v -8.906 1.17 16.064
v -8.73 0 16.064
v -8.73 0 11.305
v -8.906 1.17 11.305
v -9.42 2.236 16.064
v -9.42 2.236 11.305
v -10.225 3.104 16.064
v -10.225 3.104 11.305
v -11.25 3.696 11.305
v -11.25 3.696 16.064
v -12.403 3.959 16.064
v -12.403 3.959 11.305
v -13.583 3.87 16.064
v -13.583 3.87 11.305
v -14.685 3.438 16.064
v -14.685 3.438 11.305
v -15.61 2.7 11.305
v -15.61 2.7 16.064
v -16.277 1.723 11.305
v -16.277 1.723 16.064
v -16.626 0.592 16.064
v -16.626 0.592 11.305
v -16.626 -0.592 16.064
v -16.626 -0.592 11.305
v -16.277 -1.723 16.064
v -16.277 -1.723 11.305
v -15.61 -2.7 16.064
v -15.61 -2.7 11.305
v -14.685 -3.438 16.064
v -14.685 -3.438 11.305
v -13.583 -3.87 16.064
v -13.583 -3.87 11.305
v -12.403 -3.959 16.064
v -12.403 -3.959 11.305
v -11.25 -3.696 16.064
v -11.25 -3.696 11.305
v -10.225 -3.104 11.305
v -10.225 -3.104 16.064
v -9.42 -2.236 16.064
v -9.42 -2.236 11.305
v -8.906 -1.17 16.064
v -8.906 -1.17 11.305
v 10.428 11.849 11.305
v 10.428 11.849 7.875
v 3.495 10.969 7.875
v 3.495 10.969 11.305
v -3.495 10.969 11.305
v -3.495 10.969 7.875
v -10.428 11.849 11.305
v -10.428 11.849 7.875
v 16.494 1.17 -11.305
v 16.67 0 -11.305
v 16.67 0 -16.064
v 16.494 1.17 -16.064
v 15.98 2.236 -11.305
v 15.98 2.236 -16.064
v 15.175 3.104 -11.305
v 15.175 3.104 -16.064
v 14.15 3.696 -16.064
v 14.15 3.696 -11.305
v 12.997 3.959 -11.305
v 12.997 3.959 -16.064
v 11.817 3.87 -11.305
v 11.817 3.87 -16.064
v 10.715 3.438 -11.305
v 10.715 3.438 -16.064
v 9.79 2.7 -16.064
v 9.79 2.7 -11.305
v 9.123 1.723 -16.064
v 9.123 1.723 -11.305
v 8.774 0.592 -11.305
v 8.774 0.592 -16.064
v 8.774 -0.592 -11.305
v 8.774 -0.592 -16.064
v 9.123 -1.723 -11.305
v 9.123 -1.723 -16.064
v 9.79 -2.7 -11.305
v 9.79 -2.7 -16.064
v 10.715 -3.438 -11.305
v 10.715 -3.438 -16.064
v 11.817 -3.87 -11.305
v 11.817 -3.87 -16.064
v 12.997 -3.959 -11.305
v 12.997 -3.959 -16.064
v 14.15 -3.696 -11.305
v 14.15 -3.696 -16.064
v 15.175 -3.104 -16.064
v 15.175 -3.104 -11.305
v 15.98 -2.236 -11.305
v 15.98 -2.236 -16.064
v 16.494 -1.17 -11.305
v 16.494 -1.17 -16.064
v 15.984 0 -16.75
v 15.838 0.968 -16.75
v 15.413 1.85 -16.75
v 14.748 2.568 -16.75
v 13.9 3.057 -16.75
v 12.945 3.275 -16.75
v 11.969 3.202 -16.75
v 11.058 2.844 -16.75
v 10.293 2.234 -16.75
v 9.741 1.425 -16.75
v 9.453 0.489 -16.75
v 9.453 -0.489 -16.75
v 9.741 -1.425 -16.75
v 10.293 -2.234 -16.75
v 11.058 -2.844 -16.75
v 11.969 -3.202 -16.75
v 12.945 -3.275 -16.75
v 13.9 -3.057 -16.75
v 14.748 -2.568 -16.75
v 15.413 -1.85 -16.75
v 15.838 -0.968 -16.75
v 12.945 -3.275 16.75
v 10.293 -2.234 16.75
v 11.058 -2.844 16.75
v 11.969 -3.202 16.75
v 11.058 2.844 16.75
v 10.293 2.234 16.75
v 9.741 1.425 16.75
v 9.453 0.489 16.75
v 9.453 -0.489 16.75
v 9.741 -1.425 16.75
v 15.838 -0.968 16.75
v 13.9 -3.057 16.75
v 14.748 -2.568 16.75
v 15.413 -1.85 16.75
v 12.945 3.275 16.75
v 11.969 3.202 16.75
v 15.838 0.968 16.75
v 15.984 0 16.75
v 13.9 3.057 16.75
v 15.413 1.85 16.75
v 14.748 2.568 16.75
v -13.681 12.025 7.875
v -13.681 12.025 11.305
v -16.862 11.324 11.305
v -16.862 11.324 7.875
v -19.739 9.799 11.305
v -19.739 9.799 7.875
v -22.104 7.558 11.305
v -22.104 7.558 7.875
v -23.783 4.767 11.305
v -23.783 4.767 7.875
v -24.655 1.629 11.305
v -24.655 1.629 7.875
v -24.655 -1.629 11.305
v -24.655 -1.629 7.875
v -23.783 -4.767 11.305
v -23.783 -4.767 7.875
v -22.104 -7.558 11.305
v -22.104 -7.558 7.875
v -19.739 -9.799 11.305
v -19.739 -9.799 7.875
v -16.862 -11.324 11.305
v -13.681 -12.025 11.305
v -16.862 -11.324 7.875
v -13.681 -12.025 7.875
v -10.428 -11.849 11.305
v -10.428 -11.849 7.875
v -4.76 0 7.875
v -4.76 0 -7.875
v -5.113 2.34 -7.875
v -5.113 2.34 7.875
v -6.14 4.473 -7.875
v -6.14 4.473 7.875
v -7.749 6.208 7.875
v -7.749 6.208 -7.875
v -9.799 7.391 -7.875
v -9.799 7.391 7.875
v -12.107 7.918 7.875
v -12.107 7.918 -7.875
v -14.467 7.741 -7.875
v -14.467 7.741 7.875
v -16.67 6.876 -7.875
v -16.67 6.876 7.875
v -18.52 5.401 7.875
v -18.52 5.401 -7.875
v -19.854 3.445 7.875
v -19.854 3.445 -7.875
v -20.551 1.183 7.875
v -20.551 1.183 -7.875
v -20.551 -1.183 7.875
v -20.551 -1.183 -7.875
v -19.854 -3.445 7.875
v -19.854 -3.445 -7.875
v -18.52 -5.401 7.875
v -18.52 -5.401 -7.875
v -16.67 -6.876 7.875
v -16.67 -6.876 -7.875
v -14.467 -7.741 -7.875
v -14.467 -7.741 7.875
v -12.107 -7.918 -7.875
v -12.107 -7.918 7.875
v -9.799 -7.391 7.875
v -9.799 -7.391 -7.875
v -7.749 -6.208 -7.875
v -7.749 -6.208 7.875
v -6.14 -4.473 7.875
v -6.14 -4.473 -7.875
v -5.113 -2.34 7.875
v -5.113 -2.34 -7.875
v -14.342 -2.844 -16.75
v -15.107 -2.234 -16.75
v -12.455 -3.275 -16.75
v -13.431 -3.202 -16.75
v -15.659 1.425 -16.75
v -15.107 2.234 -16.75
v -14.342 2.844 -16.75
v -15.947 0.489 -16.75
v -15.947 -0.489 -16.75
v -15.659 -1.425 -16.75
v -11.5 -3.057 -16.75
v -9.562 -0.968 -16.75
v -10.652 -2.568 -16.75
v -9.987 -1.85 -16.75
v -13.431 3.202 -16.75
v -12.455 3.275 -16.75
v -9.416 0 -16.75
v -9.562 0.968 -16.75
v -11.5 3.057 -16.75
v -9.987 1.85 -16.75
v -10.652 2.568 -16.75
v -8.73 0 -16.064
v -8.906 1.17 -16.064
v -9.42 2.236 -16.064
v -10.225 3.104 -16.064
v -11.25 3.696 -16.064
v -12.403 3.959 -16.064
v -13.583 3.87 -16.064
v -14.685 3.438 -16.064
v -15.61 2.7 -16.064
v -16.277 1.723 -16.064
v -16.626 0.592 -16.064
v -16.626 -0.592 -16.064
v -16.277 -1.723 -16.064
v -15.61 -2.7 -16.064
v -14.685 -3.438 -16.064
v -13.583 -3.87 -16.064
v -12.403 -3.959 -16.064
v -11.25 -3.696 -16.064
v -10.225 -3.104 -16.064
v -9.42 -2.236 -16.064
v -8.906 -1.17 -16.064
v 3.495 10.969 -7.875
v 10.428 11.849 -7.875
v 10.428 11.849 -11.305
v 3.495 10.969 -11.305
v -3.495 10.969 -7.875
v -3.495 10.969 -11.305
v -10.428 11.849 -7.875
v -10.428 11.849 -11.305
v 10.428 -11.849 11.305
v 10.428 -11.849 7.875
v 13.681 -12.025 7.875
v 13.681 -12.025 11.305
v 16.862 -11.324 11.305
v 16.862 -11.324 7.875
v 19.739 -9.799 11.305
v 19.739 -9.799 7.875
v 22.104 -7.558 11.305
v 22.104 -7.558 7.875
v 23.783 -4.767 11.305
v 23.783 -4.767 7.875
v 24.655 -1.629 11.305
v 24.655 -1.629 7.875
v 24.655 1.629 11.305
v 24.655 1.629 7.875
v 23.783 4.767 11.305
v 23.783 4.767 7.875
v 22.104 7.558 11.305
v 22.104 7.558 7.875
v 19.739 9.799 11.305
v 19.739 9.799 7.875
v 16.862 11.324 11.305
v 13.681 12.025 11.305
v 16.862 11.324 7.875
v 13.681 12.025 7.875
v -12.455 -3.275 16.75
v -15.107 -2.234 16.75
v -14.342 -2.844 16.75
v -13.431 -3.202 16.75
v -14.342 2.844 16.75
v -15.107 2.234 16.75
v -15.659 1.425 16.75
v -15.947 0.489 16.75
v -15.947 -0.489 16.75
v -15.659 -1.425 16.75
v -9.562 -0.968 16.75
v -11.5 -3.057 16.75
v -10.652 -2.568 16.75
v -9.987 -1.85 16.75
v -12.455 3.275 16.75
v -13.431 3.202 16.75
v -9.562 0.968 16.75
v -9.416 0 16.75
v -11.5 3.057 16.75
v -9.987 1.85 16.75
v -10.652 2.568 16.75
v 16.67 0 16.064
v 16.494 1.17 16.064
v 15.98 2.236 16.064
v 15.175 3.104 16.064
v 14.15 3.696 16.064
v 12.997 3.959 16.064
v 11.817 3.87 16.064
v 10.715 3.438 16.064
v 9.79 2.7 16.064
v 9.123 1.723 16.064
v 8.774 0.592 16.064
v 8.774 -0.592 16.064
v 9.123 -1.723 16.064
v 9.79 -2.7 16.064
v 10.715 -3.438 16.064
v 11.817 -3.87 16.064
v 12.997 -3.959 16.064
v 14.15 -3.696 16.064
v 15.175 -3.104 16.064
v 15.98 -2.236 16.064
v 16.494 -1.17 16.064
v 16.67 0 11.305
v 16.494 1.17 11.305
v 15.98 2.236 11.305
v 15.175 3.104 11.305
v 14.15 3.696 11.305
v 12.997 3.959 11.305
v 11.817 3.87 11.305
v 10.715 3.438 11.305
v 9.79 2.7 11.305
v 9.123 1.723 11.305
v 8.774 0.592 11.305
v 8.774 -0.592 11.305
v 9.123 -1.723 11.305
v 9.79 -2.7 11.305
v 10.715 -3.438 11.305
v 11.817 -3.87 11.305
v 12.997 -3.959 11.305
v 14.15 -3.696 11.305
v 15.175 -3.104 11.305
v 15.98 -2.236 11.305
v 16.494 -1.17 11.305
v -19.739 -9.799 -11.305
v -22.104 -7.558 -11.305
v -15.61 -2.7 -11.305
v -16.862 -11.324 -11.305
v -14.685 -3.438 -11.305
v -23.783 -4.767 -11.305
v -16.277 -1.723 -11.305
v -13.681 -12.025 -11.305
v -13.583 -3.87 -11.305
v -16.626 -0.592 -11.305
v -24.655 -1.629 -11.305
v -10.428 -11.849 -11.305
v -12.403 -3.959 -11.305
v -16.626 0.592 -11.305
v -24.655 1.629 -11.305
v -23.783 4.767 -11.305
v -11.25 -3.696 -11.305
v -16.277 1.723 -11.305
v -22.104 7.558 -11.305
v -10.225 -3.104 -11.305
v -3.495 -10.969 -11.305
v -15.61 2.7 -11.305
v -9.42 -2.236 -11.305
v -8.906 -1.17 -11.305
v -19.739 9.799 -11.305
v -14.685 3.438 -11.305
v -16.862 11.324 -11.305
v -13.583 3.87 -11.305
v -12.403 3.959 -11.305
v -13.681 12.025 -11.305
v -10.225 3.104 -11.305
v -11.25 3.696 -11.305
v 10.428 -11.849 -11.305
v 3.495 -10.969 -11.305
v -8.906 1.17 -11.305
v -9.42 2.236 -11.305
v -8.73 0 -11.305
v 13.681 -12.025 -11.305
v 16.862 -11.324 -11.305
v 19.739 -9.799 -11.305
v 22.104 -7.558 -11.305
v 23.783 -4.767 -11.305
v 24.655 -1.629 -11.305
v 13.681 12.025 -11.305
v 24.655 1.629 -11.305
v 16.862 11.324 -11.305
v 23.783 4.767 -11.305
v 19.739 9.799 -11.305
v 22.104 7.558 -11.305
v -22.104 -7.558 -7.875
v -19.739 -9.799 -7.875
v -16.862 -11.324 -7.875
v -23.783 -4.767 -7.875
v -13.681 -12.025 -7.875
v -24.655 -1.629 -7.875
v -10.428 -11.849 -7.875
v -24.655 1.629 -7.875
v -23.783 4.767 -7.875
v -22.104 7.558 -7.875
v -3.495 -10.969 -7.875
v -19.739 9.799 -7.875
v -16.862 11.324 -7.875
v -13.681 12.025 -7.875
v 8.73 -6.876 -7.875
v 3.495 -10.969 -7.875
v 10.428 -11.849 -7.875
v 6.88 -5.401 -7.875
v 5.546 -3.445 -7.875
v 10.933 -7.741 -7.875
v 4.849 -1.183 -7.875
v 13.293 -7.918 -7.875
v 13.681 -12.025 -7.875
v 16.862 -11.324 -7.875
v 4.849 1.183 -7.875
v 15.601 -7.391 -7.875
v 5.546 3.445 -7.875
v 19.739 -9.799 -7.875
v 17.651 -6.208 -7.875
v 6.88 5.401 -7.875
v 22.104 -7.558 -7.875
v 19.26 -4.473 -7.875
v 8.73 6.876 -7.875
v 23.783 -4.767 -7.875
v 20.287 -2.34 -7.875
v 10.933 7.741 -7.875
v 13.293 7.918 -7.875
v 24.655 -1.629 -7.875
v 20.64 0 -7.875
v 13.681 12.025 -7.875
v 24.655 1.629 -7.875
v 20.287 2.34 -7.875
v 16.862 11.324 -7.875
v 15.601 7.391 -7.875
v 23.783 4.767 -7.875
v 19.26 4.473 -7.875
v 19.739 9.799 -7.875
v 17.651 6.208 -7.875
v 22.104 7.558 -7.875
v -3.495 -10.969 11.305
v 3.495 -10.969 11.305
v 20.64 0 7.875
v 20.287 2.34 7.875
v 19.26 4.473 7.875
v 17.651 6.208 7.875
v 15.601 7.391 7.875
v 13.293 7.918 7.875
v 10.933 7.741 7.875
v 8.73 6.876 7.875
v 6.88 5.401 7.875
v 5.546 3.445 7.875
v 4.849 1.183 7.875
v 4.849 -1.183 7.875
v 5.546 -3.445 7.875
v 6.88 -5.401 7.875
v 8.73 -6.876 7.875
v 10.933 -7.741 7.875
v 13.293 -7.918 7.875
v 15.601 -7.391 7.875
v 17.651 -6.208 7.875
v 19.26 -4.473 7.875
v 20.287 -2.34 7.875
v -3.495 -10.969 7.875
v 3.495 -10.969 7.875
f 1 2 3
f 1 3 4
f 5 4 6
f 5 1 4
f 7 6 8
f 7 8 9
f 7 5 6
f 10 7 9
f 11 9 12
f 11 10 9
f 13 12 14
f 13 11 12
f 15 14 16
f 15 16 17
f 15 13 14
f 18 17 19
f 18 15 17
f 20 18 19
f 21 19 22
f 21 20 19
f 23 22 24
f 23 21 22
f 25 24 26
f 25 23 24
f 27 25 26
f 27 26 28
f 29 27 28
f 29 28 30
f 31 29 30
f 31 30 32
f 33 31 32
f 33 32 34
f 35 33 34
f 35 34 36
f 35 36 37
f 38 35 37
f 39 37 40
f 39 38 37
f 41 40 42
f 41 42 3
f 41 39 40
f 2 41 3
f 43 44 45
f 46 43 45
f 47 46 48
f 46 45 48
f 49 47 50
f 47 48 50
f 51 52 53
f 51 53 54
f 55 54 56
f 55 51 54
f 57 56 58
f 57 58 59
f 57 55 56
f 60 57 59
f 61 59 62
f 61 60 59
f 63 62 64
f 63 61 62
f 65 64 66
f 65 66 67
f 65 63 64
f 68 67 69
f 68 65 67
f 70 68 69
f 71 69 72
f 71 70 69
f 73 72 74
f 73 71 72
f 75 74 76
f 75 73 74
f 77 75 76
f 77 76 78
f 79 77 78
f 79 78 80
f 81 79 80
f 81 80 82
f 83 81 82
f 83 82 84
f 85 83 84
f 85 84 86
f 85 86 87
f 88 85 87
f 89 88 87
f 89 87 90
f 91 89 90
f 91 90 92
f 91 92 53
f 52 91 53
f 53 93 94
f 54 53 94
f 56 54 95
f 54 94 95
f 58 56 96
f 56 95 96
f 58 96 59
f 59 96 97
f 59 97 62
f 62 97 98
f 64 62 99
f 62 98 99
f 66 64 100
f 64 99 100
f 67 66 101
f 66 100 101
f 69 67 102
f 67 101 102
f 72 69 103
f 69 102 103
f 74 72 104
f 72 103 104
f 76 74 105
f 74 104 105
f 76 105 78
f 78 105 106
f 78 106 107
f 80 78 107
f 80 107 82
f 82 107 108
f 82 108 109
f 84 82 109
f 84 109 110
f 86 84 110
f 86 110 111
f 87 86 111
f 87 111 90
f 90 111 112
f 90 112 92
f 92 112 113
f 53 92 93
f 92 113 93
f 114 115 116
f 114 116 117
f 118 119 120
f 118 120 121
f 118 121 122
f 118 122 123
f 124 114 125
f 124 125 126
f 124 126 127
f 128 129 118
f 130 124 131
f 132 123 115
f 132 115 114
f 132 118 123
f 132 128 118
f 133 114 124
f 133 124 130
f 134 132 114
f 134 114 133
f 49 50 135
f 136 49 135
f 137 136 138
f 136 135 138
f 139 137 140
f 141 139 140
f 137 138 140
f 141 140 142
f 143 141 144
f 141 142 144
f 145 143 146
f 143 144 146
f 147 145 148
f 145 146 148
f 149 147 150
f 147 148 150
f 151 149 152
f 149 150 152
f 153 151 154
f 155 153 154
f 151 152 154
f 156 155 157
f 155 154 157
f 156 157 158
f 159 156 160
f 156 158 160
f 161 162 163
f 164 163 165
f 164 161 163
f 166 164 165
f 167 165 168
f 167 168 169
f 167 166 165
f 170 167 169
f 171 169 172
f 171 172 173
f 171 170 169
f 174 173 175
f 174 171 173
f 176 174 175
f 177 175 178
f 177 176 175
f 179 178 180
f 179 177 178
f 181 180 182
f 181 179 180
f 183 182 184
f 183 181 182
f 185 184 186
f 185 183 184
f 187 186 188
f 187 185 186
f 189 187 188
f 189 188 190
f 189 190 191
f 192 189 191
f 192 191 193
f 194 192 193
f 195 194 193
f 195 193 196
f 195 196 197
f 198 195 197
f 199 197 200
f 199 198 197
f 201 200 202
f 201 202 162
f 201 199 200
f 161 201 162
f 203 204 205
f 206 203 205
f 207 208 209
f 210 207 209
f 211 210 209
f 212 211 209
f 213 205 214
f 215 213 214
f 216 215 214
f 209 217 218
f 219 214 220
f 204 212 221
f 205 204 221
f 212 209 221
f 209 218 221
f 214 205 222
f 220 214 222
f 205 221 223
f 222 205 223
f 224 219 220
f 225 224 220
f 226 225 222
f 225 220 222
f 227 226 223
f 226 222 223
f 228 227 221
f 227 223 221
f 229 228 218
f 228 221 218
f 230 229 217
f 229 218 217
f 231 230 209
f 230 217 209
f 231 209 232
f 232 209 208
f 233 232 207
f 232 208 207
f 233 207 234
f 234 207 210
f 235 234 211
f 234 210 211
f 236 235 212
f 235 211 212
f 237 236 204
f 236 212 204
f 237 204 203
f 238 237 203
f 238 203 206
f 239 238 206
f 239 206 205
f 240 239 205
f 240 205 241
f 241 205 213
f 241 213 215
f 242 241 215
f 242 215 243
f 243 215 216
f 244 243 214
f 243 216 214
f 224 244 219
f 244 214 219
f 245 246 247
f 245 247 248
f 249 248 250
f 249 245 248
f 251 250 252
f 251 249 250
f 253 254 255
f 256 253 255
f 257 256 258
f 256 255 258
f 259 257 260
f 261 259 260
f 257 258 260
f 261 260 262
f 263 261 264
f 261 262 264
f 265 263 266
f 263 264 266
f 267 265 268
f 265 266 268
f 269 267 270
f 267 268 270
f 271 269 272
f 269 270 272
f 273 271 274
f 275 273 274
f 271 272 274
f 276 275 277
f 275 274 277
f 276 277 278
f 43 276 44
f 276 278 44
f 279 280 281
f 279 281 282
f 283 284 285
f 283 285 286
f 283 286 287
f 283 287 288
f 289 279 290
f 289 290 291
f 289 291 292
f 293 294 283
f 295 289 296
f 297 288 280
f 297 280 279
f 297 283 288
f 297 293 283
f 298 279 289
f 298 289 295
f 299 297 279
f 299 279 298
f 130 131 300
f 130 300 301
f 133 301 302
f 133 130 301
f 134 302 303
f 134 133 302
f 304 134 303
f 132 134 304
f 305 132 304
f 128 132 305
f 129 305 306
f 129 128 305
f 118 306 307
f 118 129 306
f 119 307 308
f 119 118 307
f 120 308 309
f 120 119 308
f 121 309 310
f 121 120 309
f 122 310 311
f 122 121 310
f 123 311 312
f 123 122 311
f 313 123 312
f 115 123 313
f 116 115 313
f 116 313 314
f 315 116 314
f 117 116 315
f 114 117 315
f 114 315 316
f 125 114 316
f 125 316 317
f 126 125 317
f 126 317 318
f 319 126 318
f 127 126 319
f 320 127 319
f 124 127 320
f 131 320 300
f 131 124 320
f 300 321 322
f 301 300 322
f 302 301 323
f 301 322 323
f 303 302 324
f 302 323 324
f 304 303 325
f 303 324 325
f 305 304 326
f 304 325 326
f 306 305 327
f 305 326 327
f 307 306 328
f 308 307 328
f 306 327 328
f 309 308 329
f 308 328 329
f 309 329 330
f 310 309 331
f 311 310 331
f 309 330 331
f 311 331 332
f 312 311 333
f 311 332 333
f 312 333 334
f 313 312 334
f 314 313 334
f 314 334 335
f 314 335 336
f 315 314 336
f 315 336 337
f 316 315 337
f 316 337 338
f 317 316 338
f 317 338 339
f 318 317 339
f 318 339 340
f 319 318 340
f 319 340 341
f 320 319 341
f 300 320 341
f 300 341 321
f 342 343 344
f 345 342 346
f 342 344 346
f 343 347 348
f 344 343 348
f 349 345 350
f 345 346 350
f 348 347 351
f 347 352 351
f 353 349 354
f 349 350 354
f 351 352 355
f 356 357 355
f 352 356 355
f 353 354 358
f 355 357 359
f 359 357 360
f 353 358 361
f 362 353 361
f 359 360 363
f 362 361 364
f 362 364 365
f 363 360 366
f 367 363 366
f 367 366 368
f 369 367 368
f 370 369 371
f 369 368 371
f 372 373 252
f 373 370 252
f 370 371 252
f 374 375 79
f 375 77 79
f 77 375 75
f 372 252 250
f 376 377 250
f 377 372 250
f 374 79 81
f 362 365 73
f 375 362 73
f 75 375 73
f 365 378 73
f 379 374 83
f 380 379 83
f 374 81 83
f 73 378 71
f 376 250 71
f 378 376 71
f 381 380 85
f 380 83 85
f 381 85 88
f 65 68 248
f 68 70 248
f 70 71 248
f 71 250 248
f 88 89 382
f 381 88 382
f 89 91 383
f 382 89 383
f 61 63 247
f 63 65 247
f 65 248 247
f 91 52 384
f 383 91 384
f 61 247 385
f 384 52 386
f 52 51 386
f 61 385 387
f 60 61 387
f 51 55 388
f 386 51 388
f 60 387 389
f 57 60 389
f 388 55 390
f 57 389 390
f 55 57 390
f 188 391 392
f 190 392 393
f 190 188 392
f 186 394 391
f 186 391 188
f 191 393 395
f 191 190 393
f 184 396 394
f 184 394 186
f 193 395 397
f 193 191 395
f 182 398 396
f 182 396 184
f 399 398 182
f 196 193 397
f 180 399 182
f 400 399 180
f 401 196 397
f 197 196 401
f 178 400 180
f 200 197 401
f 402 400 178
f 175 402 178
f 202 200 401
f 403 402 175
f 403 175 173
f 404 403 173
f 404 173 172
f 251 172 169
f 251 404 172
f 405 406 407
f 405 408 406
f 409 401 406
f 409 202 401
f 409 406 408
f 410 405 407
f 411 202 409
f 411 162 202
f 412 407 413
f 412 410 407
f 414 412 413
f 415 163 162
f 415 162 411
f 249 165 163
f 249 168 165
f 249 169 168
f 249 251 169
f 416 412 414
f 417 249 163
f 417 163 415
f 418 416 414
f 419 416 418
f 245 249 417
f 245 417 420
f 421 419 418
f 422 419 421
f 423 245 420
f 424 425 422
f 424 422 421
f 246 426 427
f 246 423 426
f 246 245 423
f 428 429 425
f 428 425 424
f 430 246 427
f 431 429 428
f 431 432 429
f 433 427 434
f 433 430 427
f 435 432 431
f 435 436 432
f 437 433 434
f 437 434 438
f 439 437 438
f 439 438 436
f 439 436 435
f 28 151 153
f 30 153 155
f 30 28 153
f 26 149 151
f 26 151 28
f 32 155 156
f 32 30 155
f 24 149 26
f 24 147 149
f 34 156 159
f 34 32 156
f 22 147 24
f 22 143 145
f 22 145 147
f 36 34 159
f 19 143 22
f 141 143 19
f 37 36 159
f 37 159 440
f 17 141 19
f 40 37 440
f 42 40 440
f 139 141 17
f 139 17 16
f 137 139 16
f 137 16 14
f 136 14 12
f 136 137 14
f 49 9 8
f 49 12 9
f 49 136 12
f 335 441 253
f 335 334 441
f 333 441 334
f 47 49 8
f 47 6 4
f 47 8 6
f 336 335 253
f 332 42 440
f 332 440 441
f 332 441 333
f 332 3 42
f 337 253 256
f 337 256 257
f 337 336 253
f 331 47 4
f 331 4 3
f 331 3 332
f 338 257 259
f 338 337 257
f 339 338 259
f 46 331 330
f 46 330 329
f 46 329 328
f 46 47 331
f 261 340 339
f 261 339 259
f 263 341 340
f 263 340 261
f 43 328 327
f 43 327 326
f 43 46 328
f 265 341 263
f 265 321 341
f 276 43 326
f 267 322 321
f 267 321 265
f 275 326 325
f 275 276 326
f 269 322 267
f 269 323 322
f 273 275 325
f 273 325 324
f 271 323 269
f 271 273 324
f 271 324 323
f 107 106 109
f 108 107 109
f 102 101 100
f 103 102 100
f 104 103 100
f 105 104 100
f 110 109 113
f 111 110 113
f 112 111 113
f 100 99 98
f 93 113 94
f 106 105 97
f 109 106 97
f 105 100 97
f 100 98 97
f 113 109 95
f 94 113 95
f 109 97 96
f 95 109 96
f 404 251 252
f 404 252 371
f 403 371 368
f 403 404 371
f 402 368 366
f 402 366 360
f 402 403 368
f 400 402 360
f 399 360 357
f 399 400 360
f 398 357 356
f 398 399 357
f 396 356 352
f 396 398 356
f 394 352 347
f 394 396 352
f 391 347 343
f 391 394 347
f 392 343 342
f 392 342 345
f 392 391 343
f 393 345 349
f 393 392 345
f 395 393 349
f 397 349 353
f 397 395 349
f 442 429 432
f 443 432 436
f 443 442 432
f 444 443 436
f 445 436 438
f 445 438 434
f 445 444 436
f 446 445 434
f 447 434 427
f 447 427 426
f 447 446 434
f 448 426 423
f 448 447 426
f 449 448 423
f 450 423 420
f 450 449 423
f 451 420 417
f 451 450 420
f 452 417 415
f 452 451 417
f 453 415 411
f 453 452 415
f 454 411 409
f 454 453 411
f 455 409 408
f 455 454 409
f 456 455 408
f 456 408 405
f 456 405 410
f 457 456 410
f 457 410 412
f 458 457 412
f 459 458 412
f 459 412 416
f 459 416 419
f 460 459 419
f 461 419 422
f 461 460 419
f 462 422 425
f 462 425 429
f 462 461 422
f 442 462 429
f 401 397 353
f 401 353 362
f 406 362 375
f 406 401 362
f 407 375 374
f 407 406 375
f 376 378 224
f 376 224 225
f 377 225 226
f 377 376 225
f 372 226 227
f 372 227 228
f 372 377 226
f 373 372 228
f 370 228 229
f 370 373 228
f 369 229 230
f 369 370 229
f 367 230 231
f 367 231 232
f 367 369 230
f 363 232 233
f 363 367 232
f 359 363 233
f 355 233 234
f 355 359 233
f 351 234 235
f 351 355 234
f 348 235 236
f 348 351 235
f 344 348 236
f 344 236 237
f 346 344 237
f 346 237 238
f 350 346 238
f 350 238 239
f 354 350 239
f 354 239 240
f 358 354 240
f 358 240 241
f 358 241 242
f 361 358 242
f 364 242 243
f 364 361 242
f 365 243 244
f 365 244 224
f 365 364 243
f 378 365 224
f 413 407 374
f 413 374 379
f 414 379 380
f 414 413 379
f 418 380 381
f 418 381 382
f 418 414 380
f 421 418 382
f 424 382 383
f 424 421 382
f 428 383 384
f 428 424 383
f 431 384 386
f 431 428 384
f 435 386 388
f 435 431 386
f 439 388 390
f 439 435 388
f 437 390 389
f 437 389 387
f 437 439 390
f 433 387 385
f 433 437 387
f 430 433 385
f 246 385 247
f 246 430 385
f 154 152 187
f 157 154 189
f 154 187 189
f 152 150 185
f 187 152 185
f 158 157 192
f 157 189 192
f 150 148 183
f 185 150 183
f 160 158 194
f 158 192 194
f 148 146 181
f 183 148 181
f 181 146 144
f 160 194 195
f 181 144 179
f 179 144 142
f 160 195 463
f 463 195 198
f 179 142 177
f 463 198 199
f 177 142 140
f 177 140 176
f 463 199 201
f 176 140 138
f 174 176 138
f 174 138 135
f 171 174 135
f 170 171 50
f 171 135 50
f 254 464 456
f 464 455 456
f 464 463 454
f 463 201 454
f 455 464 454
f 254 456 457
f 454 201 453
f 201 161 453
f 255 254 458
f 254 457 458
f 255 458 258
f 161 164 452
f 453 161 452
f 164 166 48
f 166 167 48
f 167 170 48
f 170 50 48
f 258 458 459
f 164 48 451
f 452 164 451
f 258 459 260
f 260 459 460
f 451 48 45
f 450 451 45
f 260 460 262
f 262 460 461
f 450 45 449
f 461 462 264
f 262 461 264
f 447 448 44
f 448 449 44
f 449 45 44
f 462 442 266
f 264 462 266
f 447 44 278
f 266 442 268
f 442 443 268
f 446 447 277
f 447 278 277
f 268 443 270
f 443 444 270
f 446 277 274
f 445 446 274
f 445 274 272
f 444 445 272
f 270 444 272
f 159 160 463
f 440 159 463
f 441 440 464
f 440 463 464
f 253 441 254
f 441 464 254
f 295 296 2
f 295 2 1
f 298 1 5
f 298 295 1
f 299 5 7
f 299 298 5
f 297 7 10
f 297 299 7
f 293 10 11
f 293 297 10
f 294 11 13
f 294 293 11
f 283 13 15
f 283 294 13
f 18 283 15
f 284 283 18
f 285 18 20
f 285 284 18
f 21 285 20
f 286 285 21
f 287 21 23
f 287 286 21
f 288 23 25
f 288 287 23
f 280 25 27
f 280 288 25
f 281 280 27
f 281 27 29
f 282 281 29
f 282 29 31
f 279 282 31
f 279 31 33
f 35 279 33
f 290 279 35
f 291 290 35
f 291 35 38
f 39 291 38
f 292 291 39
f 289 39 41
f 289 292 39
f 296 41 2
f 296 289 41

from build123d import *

# Parameters (mm, degrees)
SKETCH_2_R        = 7.94
EXTRUDE_1_DEPTH   = 7.875
EXTRUDE_1_2_DEPTH = 7.875
EXTRUDE_2_DEPTH   = 3.43
SKETCH_4_R        = 3.97
EXTRUDE_3_DEPTH   = 16.75
CHAMFER_1_SIZE    = 0.686


with BuildPart() as part:
    # 草图2 → 拉伸1 (new, symmetric)
    with BuildSketch(Plane.XY):
        with Locations((12.7, 0)):
            Circle(SKETCH_2_R)
    extrude(amount=EXTRUDE_1_DEPTH, both=True)



with BuildPart() as body_2:
    # 草图2 → Extrude 1 2 (new, symmetric)
    with BuildSketch(Plane.XY):
        with Locations((-12.7, 0)):
            Circle(SKETCH_2_R)
    extrude(amount=EXTRUDE_1_2_DEPTH, both=True)


with BuildPart() as part_1:
    add(part.part)

    add(body_2.part)  # 拉伸2 merges body 2
    # 草图3 → 拉伸2 (add)
    with BuildSketch(Plane.XY.offset(7.875)):
        with BuildLine():
            ThreePointArc((-10.428153415, 11.849174574), (-24.765, 0), (-10.428153415, -11.849174574))
            ThreePointArc((-10.428153415, -11.849174574), (0, -10.8585), (10.428153415, -11.849174574))
            ThreePointArc((10.428153415, -11.849174574), (24.765, 0), (10.428153415, 11.849174574))
            ThreePointArc((10.428153415, 11.849174574), (0, 10.8585), (-10.428153415, 11.849174574))
        make_face()
    extrude_2 = extrude(amount=EXTRUDE_2_DEPTH)

    # 镜向1: 拉伸2 across plane
    add(extrude_2.mirror(Plane.XY))

    # 草图4 → 拉伸3 (add, symmetric)
    with BuildSketch(Plane.XY):
        with Locations((12.7, 0)):
            Circle(SKETCH_4_R)
        with Locations((-12.7, 0)):
            Circle(SKETCH_4_R)
    extrude(amount=EXTRUDE_3_DEPTH, both=True)

    # 倒角1
    chamfer_1_edges = [part_1.edges().sort_by_distance(p)[0] for p in [
        (8.73, 0, -16.75),
        (8.73, 0, 16.75),
        (-16.67, 0, -16.75),
        (-16.67, 0, 16.75),
    ]]
    chamfer(chamfer_1_edges, length=CHAMFER_1_SIZE)


solid = part_1.part
